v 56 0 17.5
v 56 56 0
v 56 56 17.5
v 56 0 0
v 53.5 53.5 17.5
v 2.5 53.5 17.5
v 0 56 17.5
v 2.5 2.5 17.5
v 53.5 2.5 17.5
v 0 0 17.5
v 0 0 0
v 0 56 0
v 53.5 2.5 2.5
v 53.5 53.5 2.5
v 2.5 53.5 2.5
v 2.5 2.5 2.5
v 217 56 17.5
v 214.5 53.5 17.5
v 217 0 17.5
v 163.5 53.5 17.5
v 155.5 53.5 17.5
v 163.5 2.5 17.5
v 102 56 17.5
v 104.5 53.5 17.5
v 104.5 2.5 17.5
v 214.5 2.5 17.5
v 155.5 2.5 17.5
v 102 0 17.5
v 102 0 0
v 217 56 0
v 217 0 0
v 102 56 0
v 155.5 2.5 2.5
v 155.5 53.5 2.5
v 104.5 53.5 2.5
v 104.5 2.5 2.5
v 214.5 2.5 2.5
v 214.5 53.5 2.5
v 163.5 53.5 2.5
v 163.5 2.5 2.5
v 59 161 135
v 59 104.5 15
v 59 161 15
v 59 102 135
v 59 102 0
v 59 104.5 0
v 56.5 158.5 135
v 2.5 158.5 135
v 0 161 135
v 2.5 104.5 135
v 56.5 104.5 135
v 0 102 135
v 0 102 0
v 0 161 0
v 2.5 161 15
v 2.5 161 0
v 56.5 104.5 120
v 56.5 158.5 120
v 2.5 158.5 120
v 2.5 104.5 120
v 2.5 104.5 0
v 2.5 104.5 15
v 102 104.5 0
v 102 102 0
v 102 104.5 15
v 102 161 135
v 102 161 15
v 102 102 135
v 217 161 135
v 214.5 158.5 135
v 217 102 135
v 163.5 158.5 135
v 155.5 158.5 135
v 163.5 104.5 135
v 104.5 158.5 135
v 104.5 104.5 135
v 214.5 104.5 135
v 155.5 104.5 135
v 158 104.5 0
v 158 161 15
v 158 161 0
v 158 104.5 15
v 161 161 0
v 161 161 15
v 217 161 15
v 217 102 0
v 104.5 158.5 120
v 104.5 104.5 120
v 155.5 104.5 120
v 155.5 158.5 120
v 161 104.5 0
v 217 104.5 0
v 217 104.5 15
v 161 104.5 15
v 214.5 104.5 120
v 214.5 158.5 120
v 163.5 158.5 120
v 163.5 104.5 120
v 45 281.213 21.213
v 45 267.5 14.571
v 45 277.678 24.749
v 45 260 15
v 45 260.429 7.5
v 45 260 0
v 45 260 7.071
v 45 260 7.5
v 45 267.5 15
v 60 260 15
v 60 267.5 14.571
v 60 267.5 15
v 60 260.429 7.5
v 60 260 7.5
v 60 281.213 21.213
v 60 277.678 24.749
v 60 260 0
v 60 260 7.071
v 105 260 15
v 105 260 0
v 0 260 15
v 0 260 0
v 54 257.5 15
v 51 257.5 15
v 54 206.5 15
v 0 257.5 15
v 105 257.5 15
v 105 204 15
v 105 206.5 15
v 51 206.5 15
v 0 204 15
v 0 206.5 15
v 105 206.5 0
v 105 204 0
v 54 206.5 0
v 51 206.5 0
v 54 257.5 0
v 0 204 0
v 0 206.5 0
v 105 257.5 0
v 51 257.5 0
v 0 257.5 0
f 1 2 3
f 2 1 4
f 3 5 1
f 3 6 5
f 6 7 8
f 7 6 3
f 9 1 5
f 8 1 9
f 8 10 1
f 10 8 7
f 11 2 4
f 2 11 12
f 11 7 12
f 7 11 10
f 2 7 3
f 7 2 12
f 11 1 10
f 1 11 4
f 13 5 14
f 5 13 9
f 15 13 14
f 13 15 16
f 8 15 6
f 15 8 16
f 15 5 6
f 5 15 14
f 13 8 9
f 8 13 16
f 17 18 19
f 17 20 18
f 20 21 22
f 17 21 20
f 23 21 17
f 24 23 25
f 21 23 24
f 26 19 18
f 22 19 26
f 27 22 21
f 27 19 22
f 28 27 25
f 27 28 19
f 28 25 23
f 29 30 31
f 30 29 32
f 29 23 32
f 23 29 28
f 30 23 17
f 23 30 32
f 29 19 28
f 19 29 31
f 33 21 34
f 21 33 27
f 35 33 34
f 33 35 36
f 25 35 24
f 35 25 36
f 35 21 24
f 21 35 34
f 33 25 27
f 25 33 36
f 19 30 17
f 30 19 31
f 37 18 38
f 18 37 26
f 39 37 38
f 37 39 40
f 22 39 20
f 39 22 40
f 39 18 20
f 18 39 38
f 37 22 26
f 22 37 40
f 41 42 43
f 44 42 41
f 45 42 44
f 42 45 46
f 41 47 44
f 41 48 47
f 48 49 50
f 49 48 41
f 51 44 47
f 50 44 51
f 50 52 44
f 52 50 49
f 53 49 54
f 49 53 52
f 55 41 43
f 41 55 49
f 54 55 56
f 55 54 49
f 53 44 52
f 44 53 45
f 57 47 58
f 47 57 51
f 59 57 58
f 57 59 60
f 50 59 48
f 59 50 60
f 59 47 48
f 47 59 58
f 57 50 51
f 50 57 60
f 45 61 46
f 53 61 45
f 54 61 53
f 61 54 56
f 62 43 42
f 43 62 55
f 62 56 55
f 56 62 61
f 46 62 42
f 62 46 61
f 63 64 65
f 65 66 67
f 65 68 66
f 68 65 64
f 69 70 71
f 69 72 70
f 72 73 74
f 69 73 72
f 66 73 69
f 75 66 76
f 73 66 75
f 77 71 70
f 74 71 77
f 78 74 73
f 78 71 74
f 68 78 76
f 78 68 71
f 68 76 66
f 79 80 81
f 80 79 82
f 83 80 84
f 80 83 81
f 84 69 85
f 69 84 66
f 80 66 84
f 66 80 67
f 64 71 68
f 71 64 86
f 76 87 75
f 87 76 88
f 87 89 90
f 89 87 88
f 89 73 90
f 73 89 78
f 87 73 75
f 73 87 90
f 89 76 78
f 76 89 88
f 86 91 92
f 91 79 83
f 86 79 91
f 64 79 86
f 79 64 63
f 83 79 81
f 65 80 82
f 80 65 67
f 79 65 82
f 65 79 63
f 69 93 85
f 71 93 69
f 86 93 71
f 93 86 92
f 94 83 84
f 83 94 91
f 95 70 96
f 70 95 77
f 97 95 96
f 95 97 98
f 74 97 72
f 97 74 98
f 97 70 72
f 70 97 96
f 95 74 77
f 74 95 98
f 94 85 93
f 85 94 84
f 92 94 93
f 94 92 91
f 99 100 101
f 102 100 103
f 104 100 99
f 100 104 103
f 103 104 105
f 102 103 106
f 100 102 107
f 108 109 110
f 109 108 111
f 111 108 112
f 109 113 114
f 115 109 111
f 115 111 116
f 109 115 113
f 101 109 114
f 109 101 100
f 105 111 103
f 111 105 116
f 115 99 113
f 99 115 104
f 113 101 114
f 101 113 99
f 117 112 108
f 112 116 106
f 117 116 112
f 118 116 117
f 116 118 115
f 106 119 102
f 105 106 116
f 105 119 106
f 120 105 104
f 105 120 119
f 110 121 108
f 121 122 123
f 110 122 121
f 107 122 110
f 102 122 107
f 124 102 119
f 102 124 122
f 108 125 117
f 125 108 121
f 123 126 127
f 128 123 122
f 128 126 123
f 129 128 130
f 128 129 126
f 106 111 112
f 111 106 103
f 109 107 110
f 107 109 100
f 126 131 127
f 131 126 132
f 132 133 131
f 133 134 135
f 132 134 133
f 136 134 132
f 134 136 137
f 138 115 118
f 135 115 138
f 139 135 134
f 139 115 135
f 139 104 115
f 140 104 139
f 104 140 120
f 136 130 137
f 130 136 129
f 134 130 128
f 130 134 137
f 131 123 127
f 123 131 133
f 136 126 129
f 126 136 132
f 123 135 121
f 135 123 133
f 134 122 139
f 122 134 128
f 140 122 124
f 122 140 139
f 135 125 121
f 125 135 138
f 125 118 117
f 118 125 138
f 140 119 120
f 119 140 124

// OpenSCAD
/*
measures based on:
https://www.reddit.com/r/3Dprinting/comments/5ruuxu/ikea_lack_table_dimensions_looking_for_the/ddac4qi
and corrected with some trial and error :D

Most of the variables here will be ok for ender3 or enycubic-i3-mega(-s)
*/

ikeaTableLegW = 49+2;
socksH = 15;//30;
perimetersW = 2.5;

distanceBetweenTables = 3;
legPlacementError = 3;



/*
the lack table top is 48.5w and the whole table is 447.5h
the ender3 and anycubic mega is ~470h
so we need to rise 447.5-48.5+r=470 where r is 470+48.5-447.5=71(-perimetersW) at minimum!
100 is a safe bet, it adds a little bit more air
*/
riser = 100;


render=0; //0 is all 1-5 is the objects one by one

if(render == 0) {
    socks();
    translate([2*ikeaTableLegW,0,0]) doubleSocks();
    translate([0, 2*ikeaTableLegW,0]) singleConnector(riser, legPlacementError, legPlacementError);
    translate([2*ikeaTableLegW, 2*ikeaTableLegW,0]) doubleConnector(riser, 0, legPlacementError);
    translate([0, 4*ikeaTableLegW,0]) triangleHanger();
} else {
    if(render == 1) socks();
    if(render == 2) translate([2*ikeaTableLegW,0,0]) doubleSocks();
    if(render == 3) translate([0, 2*ikeaTableLegW,0]) singleConnector(riser, legPlacementError, legPlacementError);
    if(render == 4) translate([2*ikeaTableLegW, 2*ikeaTableLegW,0]) doubleConnector(riser, 0, legPlacementError);
    if(render == 5) translate([0, 4*ikeaTableLegW,0]) triangleHanger();
}


cuttingHelper = 1;


module socks(xHelper = 0, yHelper = 0) {
    difference() {
        cube([ikeaTableLegW+2*perimetersW + xHelper, ikeaTableLegW+2*perimetersW + yHelper, socksH+perimetersW]);
        translate([perimetersW, perimetersW, perimetersW]) cube([ikeaTableLegW + xHelper, ikeaTableLegW + yHelper, socksH+cuttingHelper]);
    }
}

module doubleSocks() {
    socks();
    translate([ikeaTableLegW+2*perimetersW, 0, 0]) cube([distanceBetweenTables, ikeaTableLegW+2*perimetersW, socksH+perimetersW]);
    translate([ikeaTableLegW+2*perimetersW+distanceBetweenTables, 0, 0]) socks();
}

module singleConnector(w = 0, xHelper = 0, yHelper = 0) {
    translate([0,0,w+perimetersW+socksH]) socks(xHelper = xHelper, yHelper = yHelper);
    translate([0,0,perimetersW+socksH]) cube([ikeaTableLegW+2*perimetersW + xHelper, ikeaTableLegW+2*perimetersW + yHelper, w]);
    difference() {
        cube([ikeaTableLegW+2*perimetersW + xHelper, ikeaTableLegW+2*perimetersW + yHelper, socksH+perimetersW]);
        translate([perimetersW, perimetersW, 0-cuttingHelper]) cube([ikeaTableLegW+perimetersW+cuttingHelper + xHelper, ikeaTableLegW+perimetersW+cuttingHelper + yHelper, socksH+cuttingHelper]);
    }
}

module singleConnectorPartForDouble(w = 0, xHelper = 0, yHelper = 0) {
    translate([0,0,w+perimetersW+socksH]) socks(xHelper = xHelper, yHelper = yHelper);
    translate([0,0,perimetersW+socksH]) cube([ikeaTableLegW+2*perimetersW + xHelper, ikeaTableLegW+2*perimetersW + yHelper, w]);
    difference() {
        cube([ikeaTableLegW+2*perimetersW + xHelper, ikeaTableLegW+2*perimetersW + yHelper, socksH+perimetersW]);
        translate([0, perimetersW, 0-cuttingHelper]) cube([ikeaTableLegW+2*perimetersW+cuttingHelper + xHelper, ikeaTableLegW+perimetersW+cuttingHelper + yHelper, socksH+cuttingHelper]);
    }
}

module doubleConnector(w = 0, xHelper = 0, yHelper = 0) {
    translate([ikeaTableLegW+2*perimetersW, 0, 0]) mirror([1,0,0]) singleConnectorPartForDouble(w, xHelper, yHelper);
    translate([ikeaTableLegW+2*perimetersW, 0, 0]) cube([distanceBetweenTables, ikeaTableLegW+2*perimetersW + yHelper, w+2*socksH+2*perimetersW]);
    translate([ikeaTableLegW+2*perimetersW+distanceBetweenTables, 0, 0]) singleConnectorPartForDouble(w, xHelper, yHelper);
}

module triangleHanger() {
    triangleW= 15;
    
    cube([ikeaTableLegW*2+distanceBetweenTables,perimetersW, socksH]);
    translate([ikeaTableLegW,perimetersW,0])cube([distanceBetweenTables,ikeaTableLegW,socksH]);
    translate([0,perimetersW+ikeaTableLegW,0]) cube([ikeaTableLegW*2+distanceBetweenTables,perimetersW, socksH]);
    
    translate([ikeaTableLegW+0.5*distanceBetweenTables-triangleW*0.5,2*perimetersW+ikeaTableLegW,0]) {
        union(){
        translate([0,0,socksH/2])cube([triangleW, socksH/2, socksH/2]);
            difference(){
                rotate([45,0,0]) cube([triangleW, 2*socksH, 2*perimetersW]);
                translate([0,-socksH,0])cube([triangleW, socksH, 2*perimetersW]);
            }
        }
    }
        
}
